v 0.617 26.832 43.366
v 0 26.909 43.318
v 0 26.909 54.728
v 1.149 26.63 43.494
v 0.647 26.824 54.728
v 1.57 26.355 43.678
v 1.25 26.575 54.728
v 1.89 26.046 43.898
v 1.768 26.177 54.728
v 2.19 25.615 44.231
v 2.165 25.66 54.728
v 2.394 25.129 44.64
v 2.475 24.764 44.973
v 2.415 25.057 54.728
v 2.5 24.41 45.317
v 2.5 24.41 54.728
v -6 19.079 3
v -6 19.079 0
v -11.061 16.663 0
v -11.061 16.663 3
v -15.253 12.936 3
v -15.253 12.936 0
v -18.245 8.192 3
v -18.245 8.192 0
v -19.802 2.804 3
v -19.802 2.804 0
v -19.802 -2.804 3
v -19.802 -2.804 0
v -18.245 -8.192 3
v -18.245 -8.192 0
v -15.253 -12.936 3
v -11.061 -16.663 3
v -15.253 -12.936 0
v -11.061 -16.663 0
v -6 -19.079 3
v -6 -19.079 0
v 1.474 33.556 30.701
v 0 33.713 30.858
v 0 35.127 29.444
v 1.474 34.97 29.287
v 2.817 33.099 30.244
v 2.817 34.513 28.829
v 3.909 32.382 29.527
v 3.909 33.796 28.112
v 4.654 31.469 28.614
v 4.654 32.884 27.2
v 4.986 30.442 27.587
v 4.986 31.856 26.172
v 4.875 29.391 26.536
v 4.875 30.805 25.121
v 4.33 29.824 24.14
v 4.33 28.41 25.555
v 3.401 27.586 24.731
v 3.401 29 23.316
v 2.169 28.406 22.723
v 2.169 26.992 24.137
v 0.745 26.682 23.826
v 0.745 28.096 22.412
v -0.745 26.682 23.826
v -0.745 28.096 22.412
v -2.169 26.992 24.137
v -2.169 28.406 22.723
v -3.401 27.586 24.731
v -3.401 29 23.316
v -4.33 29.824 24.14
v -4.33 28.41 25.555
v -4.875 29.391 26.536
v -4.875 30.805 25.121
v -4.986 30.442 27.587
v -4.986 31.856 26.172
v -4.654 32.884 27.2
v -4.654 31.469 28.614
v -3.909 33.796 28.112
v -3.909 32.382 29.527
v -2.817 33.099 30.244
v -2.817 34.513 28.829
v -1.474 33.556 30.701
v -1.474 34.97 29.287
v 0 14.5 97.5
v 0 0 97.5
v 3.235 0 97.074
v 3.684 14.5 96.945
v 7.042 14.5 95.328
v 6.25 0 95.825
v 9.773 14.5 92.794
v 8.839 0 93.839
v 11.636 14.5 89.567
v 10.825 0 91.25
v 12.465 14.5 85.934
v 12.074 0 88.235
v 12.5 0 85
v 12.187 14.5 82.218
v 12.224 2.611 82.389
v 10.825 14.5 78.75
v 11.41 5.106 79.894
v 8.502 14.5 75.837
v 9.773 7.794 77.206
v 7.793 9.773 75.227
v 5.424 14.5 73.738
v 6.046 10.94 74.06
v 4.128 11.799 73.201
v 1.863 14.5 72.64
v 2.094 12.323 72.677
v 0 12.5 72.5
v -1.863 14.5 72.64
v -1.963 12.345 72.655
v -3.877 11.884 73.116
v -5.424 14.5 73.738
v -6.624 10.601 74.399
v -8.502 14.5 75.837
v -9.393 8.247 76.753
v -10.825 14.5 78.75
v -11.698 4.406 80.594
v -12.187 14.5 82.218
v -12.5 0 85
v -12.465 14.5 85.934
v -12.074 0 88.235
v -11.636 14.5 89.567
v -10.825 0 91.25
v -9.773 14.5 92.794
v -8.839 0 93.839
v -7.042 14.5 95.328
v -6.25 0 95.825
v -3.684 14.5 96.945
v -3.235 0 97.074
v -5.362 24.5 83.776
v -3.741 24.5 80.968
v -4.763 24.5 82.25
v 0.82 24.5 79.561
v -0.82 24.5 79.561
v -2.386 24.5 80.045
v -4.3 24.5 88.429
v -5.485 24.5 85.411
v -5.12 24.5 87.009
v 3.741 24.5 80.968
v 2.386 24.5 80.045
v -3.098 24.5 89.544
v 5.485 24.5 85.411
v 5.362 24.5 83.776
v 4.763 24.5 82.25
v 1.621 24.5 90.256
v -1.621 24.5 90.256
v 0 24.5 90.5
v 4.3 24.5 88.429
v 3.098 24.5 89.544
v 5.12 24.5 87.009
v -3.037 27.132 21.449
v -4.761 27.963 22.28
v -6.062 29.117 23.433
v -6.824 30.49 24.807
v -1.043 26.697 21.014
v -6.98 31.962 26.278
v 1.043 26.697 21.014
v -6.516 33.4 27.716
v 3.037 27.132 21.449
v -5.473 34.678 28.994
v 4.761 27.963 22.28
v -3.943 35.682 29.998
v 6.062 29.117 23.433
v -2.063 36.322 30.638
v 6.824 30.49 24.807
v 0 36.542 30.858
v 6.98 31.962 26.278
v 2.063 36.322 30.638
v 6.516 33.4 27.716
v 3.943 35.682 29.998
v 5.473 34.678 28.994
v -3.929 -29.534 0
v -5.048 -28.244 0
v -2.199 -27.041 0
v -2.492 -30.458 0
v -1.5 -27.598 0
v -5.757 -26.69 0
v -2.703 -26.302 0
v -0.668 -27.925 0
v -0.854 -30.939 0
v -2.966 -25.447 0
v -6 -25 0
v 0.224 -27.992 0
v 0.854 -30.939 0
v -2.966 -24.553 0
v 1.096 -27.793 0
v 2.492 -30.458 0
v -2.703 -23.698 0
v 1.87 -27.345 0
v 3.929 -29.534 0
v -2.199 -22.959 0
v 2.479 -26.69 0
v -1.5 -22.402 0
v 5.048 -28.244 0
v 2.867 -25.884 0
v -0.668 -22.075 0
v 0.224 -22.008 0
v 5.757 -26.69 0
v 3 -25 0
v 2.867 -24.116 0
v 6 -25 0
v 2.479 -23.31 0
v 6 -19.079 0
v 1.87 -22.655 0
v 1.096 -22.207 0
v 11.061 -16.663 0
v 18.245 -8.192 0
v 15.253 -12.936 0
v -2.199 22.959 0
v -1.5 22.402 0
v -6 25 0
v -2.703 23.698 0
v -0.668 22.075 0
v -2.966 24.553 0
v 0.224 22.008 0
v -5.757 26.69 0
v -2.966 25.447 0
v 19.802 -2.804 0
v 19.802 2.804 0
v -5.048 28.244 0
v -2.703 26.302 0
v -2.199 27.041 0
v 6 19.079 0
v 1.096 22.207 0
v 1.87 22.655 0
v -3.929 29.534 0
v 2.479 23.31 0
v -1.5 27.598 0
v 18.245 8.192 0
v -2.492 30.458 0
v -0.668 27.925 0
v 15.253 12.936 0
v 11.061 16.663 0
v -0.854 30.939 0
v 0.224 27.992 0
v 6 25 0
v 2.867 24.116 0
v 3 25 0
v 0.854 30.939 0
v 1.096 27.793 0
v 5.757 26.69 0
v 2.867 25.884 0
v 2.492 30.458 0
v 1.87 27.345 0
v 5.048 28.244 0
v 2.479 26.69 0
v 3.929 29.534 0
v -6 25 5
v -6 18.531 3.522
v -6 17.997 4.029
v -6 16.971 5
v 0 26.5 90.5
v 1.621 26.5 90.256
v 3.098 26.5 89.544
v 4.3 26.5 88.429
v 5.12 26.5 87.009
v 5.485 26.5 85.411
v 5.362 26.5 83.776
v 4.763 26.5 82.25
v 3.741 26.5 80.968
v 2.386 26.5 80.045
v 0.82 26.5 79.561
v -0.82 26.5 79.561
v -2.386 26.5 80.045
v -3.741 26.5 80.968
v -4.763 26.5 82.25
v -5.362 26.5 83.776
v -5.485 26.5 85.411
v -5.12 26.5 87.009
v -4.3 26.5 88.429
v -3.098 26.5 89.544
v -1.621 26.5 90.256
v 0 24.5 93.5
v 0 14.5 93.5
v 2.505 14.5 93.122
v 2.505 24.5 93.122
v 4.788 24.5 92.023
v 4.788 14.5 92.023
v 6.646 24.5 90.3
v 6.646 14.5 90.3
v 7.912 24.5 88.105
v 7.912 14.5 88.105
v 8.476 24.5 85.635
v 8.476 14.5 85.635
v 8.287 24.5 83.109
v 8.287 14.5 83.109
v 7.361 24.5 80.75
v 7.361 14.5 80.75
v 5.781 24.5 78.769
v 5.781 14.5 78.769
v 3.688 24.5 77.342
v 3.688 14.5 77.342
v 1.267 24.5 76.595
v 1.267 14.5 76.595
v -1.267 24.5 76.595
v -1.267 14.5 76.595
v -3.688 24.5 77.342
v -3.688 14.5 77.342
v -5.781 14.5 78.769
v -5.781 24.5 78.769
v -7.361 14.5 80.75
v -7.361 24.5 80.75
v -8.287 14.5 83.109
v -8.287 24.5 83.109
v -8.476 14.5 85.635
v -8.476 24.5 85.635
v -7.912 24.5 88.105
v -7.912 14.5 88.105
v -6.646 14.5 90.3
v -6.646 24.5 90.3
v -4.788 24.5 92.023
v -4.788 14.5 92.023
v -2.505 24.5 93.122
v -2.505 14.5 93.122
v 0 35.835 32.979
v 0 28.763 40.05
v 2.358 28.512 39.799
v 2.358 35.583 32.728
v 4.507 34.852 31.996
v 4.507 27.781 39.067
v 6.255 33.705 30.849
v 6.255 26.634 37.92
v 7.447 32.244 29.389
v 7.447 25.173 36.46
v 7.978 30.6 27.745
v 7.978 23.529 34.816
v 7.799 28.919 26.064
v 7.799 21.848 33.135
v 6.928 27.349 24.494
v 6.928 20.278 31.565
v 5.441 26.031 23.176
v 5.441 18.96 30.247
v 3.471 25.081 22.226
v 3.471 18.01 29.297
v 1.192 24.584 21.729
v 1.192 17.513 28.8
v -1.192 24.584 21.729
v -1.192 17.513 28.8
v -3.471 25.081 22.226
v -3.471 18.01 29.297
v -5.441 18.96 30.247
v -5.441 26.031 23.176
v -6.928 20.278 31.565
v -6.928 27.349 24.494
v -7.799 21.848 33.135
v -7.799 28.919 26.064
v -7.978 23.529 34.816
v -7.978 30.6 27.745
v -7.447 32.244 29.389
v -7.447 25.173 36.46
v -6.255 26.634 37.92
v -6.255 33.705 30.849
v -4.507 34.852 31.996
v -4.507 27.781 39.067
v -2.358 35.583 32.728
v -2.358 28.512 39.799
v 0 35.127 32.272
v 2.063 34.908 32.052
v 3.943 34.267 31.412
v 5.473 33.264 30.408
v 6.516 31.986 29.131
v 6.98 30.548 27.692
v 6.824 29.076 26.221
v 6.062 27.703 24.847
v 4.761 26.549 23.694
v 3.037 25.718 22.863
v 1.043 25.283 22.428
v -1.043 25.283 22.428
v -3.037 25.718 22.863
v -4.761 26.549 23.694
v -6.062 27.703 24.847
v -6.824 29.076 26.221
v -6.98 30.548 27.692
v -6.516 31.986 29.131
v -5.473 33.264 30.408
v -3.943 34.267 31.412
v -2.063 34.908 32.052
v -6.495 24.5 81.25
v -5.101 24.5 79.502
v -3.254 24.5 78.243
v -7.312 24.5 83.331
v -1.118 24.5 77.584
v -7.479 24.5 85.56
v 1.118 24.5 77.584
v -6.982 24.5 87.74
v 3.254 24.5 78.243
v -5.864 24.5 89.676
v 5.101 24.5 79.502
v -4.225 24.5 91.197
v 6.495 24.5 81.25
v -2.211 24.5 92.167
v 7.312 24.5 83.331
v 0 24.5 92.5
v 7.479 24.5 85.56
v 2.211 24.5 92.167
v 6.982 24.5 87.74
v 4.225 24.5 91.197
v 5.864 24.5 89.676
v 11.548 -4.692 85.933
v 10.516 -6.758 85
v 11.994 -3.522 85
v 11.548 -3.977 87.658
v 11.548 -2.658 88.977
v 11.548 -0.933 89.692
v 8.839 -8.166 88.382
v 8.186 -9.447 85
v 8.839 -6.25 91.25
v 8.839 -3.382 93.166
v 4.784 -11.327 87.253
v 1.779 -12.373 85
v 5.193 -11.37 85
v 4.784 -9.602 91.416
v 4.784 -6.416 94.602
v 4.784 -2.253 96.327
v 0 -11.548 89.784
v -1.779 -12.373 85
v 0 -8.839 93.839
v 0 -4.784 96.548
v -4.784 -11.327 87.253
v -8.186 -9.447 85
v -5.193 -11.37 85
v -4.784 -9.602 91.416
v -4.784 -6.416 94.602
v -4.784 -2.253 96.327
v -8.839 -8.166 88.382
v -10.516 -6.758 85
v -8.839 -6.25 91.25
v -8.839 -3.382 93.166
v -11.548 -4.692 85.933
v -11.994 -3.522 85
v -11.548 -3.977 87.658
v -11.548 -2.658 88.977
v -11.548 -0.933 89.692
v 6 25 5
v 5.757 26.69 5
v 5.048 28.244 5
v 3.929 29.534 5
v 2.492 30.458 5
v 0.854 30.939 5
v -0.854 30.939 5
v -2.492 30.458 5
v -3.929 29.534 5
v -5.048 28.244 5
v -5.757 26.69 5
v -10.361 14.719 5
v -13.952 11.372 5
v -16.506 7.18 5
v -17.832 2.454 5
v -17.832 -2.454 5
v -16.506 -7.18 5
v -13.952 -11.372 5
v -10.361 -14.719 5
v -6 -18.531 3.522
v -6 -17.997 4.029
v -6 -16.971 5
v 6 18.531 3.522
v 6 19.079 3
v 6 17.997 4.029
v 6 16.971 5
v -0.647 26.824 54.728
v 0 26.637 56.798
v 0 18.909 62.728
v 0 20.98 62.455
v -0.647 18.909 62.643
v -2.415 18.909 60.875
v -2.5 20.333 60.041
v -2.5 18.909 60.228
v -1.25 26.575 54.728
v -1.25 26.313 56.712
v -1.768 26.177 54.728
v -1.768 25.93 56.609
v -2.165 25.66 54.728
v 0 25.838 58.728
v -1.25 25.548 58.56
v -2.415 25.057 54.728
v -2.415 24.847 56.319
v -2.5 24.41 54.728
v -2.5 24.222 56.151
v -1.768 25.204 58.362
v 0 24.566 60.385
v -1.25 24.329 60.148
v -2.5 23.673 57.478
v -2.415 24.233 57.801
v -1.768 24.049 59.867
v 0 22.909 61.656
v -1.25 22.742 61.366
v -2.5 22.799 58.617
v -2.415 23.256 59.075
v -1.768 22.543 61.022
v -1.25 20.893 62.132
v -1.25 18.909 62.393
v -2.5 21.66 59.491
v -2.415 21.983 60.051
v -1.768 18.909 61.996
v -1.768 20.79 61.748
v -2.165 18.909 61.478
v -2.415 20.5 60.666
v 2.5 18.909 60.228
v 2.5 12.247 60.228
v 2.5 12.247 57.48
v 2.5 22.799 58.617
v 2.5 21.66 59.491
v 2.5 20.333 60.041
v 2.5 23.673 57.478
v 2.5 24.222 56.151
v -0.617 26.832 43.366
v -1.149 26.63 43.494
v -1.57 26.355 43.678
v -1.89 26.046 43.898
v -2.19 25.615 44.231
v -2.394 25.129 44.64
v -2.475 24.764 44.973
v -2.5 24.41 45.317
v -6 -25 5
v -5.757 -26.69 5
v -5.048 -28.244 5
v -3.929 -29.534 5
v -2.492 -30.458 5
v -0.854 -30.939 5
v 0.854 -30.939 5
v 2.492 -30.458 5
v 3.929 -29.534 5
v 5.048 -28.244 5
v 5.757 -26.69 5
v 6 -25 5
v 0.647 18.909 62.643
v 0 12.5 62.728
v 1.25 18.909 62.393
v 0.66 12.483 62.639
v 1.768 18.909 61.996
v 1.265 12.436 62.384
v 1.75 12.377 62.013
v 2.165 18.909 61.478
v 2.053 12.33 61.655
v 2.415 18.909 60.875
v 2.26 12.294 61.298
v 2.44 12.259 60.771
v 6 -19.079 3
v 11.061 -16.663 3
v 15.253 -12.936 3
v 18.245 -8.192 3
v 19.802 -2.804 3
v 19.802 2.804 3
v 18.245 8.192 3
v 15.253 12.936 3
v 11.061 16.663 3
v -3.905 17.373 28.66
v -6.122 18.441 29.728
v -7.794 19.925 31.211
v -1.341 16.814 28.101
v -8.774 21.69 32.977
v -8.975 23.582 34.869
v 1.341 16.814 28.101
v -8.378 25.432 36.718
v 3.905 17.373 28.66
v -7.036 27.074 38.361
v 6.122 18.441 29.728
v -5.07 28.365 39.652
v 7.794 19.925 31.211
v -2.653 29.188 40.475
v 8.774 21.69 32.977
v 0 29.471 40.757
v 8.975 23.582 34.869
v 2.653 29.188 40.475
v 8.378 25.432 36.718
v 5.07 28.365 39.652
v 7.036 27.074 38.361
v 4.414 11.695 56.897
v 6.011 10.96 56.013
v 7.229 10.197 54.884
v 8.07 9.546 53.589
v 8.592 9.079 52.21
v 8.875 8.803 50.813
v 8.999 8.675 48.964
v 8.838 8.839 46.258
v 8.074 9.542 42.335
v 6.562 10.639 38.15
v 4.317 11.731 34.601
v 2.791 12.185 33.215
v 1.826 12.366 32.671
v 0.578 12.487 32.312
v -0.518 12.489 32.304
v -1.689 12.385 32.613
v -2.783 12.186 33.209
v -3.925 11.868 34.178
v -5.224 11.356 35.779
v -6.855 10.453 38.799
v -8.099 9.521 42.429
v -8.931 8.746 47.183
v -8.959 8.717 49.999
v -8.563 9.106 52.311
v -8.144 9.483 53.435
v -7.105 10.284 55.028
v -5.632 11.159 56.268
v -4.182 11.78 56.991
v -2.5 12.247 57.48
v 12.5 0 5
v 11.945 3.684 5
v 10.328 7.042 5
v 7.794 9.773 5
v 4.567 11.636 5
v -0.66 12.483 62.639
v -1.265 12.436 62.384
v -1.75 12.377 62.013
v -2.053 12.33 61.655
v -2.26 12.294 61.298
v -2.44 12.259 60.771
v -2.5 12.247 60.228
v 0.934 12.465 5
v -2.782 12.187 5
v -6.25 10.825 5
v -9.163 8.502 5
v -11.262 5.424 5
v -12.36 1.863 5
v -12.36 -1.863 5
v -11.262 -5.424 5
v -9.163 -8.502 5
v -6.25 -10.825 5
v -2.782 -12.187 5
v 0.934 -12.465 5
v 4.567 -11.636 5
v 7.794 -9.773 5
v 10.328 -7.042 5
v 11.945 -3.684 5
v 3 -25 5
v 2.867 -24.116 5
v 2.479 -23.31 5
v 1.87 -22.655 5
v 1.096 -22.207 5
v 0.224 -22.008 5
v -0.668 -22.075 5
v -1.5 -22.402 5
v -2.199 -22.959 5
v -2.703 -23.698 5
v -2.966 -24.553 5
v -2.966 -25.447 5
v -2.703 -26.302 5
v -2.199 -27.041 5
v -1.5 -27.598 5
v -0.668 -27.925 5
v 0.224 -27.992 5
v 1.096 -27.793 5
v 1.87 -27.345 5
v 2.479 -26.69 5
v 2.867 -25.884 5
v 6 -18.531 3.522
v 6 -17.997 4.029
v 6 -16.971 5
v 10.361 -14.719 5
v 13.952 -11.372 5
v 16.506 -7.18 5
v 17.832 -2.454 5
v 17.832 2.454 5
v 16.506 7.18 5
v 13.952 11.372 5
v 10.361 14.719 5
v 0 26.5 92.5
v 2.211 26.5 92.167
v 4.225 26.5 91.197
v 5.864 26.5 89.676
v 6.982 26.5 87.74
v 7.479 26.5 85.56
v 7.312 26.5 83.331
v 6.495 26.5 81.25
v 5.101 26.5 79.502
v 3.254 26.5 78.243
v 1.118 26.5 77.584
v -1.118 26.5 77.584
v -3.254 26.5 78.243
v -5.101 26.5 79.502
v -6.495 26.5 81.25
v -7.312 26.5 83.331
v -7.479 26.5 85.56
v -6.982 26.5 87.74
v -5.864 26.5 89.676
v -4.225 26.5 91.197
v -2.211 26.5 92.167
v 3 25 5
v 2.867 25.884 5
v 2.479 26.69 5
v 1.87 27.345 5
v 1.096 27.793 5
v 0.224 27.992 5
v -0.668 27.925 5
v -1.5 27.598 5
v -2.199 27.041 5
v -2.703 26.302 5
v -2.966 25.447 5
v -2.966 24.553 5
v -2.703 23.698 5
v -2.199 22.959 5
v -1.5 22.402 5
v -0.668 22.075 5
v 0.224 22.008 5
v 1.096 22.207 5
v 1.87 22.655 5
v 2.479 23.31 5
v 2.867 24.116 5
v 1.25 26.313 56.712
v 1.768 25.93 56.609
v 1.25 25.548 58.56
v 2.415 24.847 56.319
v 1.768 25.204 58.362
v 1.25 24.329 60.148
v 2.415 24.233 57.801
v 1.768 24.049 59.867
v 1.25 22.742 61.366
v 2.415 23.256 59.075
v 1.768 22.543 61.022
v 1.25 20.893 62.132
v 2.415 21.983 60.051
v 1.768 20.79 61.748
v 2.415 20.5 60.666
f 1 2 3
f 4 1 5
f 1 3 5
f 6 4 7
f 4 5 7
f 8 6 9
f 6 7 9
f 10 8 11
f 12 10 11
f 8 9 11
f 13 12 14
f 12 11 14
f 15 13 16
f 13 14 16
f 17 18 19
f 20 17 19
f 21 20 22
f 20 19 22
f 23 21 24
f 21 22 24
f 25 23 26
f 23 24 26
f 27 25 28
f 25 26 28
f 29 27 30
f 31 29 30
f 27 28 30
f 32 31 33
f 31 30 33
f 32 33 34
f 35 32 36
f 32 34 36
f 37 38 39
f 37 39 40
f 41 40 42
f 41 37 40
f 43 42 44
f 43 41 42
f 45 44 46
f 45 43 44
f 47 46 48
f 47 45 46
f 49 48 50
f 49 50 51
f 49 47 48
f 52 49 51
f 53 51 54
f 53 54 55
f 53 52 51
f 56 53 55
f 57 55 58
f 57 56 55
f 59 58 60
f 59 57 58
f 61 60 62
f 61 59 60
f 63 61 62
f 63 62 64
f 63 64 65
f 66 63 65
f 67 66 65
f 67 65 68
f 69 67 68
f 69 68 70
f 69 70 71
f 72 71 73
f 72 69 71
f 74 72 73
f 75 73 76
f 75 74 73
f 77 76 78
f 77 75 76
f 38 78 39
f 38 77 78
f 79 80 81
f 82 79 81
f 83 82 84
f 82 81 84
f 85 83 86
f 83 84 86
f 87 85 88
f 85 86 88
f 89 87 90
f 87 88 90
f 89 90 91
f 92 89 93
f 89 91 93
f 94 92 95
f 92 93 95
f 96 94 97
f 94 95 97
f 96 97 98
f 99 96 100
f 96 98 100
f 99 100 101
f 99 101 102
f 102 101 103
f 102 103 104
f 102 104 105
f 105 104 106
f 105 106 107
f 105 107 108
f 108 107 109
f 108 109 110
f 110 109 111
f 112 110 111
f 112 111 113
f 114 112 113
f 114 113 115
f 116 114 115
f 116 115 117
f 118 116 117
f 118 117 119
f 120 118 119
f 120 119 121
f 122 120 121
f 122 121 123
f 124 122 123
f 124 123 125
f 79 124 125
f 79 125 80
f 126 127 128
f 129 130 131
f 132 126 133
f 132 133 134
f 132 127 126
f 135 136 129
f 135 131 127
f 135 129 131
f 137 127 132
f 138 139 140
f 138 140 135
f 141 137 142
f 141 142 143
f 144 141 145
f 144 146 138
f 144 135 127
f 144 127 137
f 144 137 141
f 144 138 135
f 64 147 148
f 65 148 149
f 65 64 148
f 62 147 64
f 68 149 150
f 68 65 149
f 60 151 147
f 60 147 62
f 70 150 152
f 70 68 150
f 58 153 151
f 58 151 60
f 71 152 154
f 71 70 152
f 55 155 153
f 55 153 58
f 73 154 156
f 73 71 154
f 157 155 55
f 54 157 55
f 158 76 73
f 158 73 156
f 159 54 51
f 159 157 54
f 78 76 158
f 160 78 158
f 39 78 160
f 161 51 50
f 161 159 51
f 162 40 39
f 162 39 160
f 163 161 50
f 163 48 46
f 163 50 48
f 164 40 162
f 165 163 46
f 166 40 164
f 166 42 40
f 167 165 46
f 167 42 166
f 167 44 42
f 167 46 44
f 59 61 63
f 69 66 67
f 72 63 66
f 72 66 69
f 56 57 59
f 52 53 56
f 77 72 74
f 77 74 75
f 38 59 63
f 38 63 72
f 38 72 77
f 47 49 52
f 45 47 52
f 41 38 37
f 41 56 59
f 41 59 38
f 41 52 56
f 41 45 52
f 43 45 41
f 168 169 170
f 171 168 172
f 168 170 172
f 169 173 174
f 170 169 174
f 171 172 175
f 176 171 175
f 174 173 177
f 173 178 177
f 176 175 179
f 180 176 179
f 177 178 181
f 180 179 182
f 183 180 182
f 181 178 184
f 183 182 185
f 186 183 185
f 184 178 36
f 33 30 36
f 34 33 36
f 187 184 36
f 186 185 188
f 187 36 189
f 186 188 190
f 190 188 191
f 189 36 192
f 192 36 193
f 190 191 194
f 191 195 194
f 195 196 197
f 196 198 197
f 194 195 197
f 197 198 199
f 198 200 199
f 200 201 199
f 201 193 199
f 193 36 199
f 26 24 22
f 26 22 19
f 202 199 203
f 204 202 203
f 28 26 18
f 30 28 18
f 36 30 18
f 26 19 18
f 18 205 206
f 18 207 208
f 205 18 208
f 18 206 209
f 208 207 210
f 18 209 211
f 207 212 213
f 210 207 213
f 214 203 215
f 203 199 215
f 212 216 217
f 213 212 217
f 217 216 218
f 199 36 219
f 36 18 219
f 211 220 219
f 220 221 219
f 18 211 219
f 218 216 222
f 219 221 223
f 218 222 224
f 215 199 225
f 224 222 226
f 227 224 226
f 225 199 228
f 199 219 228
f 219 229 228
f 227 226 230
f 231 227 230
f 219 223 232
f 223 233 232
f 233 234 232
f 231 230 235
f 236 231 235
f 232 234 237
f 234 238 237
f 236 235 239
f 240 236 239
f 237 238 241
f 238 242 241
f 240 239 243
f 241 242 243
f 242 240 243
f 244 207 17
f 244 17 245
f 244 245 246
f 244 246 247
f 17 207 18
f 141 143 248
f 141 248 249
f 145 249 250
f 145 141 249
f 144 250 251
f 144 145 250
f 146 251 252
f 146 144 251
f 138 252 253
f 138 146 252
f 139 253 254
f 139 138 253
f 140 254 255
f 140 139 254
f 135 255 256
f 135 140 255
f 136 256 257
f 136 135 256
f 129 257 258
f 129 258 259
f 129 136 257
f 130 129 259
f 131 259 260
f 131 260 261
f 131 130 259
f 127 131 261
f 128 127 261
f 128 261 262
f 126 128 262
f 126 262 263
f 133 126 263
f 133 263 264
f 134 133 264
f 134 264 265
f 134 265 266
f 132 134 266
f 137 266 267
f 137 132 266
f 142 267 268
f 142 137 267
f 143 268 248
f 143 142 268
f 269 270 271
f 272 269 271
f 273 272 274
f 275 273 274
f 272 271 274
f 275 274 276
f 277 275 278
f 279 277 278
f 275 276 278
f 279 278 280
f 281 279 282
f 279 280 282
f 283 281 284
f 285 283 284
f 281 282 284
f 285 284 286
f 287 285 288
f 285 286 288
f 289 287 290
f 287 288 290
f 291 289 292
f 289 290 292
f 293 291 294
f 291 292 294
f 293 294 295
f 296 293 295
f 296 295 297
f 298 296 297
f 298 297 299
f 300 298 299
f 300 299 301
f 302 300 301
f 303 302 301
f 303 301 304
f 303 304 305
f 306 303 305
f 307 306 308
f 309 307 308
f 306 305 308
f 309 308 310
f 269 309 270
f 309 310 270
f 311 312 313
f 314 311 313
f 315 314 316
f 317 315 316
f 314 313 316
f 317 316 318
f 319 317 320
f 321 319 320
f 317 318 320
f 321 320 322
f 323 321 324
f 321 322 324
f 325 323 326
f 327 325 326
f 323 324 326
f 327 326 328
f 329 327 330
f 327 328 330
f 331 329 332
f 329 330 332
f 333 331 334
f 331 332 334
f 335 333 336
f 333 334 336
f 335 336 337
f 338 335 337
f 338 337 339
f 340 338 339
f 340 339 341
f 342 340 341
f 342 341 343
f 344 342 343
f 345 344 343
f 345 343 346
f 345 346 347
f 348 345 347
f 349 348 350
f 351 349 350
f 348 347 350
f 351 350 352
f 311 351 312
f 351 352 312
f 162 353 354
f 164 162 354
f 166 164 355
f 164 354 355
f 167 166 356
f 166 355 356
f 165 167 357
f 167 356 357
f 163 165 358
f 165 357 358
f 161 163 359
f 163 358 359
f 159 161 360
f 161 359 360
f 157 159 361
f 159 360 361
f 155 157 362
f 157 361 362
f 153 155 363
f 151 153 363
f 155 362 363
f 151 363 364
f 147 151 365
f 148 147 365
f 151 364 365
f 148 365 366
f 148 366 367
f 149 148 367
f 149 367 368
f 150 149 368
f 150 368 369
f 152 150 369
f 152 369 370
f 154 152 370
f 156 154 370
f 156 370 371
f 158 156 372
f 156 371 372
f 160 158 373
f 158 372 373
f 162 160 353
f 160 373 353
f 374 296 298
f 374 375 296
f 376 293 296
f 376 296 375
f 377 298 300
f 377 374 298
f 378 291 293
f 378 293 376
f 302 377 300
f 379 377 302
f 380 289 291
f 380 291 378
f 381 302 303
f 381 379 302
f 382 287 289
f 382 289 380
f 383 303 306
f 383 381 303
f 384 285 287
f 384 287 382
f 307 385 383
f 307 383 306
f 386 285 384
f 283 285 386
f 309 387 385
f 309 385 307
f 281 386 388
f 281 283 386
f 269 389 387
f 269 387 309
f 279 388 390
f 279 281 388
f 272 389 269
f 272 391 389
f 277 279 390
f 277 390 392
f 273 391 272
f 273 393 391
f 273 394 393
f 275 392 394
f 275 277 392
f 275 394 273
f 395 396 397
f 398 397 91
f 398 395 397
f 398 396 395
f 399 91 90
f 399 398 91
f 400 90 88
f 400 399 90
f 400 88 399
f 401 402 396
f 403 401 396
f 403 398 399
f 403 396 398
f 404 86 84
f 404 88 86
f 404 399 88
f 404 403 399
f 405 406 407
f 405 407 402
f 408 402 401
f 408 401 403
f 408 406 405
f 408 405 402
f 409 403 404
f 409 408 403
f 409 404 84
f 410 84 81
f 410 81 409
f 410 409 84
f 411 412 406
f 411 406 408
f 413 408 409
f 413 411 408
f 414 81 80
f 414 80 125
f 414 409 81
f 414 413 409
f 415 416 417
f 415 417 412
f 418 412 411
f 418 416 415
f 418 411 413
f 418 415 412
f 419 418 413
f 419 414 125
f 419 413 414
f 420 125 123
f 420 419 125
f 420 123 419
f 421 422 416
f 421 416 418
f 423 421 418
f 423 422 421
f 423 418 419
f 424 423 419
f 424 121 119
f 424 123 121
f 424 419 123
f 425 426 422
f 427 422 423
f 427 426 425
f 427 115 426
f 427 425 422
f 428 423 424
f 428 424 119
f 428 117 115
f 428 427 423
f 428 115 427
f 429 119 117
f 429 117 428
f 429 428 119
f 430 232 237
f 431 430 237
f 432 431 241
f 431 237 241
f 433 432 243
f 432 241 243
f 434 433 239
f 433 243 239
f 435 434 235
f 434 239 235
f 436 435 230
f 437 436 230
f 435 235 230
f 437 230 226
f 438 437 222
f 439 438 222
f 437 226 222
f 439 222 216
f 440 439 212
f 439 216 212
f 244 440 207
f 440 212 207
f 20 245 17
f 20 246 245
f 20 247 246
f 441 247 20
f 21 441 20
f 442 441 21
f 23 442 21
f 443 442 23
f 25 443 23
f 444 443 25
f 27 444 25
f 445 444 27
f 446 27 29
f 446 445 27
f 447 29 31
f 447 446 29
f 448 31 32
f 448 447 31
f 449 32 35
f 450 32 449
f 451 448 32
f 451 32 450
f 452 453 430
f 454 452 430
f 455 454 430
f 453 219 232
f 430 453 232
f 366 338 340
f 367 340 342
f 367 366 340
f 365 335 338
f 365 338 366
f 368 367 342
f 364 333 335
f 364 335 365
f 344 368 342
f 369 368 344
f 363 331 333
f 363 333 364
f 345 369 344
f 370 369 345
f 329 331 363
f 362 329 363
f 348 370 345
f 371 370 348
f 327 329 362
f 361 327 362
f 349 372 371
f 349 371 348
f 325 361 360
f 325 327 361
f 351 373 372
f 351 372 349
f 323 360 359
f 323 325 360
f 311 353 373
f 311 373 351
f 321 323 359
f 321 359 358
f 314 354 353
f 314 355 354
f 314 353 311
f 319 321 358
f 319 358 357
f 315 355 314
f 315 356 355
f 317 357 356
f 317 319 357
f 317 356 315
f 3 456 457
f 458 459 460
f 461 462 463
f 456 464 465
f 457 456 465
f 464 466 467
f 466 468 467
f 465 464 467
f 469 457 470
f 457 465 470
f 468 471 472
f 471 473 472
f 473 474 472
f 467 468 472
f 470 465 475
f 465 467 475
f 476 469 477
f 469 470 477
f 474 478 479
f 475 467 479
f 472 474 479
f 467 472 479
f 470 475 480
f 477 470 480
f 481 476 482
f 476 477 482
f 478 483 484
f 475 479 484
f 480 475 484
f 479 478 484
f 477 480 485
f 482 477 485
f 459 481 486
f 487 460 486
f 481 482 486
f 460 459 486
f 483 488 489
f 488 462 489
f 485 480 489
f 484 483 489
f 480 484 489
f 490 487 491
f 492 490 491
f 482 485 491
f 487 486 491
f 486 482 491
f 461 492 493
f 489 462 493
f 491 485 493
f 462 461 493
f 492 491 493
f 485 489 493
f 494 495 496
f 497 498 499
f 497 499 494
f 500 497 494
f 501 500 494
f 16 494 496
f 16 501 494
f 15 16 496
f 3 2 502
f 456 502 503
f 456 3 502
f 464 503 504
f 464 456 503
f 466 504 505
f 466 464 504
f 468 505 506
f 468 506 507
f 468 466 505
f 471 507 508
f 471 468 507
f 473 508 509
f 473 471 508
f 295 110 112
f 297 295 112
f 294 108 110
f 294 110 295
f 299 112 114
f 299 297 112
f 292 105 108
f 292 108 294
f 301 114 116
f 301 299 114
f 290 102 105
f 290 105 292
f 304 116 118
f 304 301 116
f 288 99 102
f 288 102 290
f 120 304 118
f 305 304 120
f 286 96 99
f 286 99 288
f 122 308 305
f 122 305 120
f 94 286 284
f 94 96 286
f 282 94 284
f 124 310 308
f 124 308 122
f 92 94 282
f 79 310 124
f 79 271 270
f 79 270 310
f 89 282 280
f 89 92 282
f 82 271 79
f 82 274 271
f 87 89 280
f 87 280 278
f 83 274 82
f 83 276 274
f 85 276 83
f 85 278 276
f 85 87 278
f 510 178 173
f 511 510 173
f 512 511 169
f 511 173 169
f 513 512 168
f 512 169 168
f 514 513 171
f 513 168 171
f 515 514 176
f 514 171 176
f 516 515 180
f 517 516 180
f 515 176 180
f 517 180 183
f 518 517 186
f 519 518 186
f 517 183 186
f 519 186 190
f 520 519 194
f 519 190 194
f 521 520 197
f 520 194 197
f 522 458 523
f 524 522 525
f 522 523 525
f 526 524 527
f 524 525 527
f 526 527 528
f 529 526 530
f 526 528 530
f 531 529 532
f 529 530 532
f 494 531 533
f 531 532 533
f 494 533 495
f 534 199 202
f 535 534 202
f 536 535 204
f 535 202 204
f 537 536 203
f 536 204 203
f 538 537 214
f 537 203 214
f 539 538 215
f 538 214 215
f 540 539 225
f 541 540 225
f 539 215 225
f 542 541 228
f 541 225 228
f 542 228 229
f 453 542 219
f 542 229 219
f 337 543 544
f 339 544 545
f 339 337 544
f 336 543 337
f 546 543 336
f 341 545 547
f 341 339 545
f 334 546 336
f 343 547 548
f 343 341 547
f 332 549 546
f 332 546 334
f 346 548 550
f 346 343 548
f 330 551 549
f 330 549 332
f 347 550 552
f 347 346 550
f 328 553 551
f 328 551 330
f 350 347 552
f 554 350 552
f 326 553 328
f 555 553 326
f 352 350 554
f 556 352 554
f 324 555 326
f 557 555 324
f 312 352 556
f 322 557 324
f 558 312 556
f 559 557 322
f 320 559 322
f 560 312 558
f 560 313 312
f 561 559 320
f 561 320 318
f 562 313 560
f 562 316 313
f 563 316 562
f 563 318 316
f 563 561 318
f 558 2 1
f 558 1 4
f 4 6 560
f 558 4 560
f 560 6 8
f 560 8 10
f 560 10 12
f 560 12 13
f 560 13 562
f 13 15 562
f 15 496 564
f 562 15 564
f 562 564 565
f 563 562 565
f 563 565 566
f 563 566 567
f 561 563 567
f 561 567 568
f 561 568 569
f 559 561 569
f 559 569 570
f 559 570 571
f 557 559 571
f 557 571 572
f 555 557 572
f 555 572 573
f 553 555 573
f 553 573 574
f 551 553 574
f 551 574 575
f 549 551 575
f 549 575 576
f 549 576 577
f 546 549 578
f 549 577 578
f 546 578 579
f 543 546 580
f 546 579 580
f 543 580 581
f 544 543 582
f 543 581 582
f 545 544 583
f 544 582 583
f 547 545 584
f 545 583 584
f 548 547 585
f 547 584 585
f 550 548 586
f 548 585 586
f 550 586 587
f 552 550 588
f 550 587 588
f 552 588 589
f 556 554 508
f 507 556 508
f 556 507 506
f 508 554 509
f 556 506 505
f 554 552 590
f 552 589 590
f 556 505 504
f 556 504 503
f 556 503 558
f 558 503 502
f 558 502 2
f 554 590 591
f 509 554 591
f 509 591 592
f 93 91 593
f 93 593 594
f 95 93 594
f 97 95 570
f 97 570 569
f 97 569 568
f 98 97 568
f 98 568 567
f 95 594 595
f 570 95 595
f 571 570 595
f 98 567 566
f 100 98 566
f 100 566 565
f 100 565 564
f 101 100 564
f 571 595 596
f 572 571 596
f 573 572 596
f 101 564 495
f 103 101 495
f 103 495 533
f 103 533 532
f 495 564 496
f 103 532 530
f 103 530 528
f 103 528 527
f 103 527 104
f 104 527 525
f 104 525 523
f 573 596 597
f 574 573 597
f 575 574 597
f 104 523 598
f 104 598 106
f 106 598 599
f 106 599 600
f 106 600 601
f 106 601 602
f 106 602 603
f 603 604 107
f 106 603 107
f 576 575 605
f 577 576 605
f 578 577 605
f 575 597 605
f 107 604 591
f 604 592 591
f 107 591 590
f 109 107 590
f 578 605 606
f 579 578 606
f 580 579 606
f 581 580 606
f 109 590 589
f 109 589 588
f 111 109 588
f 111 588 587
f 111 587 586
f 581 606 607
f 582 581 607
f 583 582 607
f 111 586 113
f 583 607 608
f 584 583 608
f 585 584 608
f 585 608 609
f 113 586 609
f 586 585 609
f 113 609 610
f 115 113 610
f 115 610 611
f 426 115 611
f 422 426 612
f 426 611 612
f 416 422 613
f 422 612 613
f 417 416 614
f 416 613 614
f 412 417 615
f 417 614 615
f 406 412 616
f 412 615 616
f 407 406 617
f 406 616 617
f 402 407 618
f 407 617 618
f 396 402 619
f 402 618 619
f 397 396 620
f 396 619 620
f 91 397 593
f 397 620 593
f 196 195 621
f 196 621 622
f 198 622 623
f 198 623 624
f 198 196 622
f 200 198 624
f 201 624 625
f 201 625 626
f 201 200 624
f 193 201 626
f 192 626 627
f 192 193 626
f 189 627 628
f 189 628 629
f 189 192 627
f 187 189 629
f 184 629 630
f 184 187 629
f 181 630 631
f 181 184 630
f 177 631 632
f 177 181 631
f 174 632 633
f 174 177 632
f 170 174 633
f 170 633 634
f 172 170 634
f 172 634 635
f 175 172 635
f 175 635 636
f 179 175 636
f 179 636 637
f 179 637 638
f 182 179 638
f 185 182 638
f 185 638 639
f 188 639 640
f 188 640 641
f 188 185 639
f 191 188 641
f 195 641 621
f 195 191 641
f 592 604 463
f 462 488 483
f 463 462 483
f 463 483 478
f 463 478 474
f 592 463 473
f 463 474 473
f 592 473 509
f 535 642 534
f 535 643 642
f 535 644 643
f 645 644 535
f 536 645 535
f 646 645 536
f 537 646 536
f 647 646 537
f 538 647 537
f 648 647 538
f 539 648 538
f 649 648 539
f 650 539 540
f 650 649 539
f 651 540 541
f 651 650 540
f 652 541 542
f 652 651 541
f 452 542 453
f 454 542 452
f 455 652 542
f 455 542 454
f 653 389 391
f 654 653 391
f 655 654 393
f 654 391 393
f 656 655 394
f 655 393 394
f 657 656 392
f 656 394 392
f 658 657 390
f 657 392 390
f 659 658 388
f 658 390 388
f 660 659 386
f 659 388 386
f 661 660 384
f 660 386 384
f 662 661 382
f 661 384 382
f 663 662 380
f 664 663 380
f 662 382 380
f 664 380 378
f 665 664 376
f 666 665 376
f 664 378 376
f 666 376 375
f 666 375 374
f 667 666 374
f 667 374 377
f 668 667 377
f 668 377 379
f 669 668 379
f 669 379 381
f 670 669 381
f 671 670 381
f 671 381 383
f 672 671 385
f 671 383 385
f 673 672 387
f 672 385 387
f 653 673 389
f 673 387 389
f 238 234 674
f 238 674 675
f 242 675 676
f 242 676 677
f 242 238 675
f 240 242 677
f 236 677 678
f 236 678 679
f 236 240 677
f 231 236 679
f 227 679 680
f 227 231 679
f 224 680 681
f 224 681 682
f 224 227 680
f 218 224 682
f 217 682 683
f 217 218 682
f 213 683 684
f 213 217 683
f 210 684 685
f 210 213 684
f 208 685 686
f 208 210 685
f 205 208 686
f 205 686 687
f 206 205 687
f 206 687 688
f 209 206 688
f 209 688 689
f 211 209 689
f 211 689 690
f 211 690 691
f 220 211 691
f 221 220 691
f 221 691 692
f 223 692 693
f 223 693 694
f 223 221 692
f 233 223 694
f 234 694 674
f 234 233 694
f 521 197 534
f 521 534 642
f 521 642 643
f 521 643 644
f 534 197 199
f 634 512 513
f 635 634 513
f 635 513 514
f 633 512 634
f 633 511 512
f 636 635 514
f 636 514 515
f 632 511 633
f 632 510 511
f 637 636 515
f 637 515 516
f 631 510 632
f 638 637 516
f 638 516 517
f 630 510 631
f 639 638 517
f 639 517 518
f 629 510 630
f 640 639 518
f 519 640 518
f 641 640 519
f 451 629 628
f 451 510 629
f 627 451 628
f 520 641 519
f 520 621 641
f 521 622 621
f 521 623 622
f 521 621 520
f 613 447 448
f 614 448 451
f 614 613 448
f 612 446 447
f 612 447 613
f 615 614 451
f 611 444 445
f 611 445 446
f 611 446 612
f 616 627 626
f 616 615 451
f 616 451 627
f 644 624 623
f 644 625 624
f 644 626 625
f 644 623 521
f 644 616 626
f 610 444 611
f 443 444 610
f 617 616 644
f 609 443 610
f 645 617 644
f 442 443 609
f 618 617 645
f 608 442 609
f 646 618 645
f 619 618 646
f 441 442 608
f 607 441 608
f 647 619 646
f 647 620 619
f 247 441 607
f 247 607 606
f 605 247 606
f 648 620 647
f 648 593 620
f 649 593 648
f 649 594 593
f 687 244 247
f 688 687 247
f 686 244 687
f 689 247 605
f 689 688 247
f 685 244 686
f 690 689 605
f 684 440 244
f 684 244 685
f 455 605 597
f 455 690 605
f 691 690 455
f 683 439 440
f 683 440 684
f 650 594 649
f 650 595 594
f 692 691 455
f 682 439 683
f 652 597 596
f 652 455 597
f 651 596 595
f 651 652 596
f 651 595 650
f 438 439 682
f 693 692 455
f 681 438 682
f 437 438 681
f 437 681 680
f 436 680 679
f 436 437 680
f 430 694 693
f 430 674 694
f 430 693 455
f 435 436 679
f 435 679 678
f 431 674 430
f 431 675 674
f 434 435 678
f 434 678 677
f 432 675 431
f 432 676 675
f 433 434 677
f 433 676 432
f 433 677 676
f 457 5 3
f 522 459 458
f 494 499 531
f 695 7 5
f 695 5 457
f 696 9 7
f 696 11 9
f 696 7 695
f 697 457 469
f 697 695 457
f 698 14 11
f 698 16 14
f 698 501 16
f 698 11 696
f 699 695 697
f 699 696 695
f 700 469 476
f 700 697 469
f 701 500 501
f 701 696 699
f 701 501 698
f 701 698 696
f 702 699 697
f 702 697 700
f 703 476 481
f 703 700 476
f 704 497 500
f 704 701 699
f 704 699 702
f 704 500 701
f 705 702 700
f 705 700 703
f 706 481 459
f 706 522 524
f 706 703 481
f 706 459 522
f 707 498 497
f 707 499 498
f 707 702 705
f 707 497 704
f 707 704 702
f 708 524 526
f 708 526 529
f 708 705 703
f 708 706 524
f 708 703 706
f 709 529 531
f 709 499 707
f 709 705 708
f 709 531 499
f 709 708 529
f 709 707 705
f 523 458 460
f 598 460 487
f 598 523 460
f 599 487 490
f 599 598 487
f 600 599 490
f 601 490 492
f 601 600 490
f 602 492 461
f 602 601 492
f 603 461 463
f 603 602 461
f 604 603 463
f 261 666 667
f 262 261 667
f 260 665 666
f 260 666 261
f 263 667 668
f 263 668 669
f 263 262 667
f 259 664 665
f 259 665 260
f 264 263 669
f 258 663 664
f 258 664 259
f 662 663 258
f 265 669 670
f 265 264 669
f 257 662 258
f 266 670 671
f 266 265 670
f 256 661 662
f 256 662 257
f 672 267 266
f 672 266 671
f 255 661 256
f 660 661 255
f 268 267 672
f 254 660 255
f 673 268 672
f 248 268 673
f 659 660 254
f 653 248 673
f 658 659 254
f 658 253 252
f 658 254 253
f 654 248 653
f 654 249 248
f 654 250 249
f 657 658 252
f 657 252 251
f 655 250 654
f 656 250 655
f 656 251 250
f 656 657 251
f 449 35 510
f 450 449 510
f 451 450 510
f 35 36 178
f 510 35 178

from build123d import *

# Parameters (mm, degrees)
SZKIC1_R                         = 3
DODANIE_WYCI_GNI_CIE1_DEPTH      = 5
SFAZOWANIE1_SIZE                 = 2
SZKIC2_R                         = 12.5
DODANIE_WYCI_GNI_CIE2_DEPTH      = 80
DODANIE_WYCI_GNI_CIE3_DEPTH      = 15
DODANIE_WYCI_GNI_CIE3_DEPTH_BACK = 10
SZKIC5_R                         = 9
SZKIC6_R                         = 8
DODANIE_WYCI_GNI_CIE4_DEPTH      = 10
SZKIC7_R                         = 7
SZKIC7_R_2                       = 5
DODANIE_WYCI_GNI_CIE5_DEPTH      = 2
EBRO1_START                      = -2.5
EBRO1_DEPTH                      = 5
ZAOKR_GLENIE1_R                  = 2.5
DODANIE_WYCI_GNI_CIE6_DEPTH      = 2
DODANIE_WYCI_GNI_CIE6_DEPTH_BACK = 12.5
SZKIC9_R                         = 12.5
OBR_T1_ANGLE                     = 90
SZKIC11_R                        = 8.5
DODANIE_WYCI_GNI_CIE7_DEPTH      = 10
SZKIC12_R                        = 7.5
SZKIC12_R_2                      = 5.5
DODANIE_WYCI_GNI_CIE8_DEPTH      = 2


# Read off the part's stored shape, not the designer's step: Żebro1
with BuildPart() as part:
    # Szkic1 → Dodanie-wyciągnięcie1 (new body)
    with BuildSketch(Plane.XY):
        with BuildLine():
            Line((6, 19.078784028), (6, 25))
            ThreePointArc((6, 25), (0, 31), (-6, 25))
            Line((-6, 25), (-6, 19.078784028))
            ThreePointArc((-6, 19.078784028), (-20, 0), (-6, -19.078784028))
            Line((-6, -19.078784028), (-6, -25))
            ThreePointArc((-6, -25), (0, -31), (6, -25))
            Line((6, -25), (6, -19.078784028))
            ThreePointArc((6, -19.078784028), (20, 0), (6, 19.078784028))
        make_face()
        with Locations((0, 25)):
            Circle(SZKIC1_R, mode=Mode.SUBTRACT)
        with Locations((0, -25)):
            Circle(SZKIC1_R, mode=Mode.SUBTRACT)
    extrude(amount=DODANIE_WYCI_GNI_CIE1_DEPTH)

    # Sfazowanie1
    sfazowanie1_edges = [part.edges().sort_by_distance(p)[0] for p in [
        (20, 0, 5),
        (-20, 0, 5),
    ]]
    chamfer(sfazowanie1_edges, length=SFAZOWANIE1_SIZE)

    # Szkic2 → Dodanie-wyciągnięcie2 (add)
    with BuildSketch(Plane.XY.offset(5)):
        Circle(SZKIC2_R)
    extrude(amount=DODANIE_WYCI_GNI_CIE2_DEPTH)

    # Szkic5 → Dodanie-wyciągnięcie3 (add, two sides: drawn at the far end of the back side and taken through both)
    with BuildSketch(Plane(origin=(0, 12.5, 45), x_dir=(1, 0, 0), z_dir=(0, 0.7071067811865437, -0.7071067811865515)).offset(-DODANIE_WYCI_GNI_CIE3_DEPTH_BACK)):
        with Locations(Location((0, 0, 0), (0, 0, 270))):
            Circle(SZKIC5_R)
    extrude(amount=DODANIE_WYCI_GNI_CIE3_DEPTH + DODANIE_WYCI_GNI_CIE3_DEPTH_BACK)

    # Szkic6 → Dodanie-wyciągnięcie4 (add)
    with BuildSketch(Plane(origin=(0, -5.643398282, 5.643398282), x_dir=(1, 0, 0), z_dir=(0, 0.7071067811865437, -0.7071067811865513))):
        with Locations(Location((0, -40.658639918, 0), (0, 0, 270))):
            Circle(SZKIC6_R)
    extrude(amount=DODANIE_WYCI_GNI_CIE4_DEPTH)

    # Szkic7 → Dodanie-wyciągnięcie5 (add)
    with BuildSketch(Plane(origin=(0, 1.42766953, -1.42766953), x_dir=(1, 0, 0), z_dir=(0, 0.7071067811865437, -0.7071067811865515))):
        with Locations(Location((0, -40.658639918, 0), (0, 0, 270))):
            Circle(SZKIC7_R)
        with Locations(Location((0, -40.658639918, 0), (0, 0, 270))):
            Circle(SZKIC7_R_2, mode=Mode.SUBTRACT)
    extrude(amount=DODANIE_WYCI_GNI_CIE5_DEPTH)

    # Żebro1 outline → Żebro1 (add)
    with BuildSketch(Plane(origin=(0, 0, 0), x_dir=(0, 0, -1), z_dir=(1, 0, 0)).offset(EBRO1_START)):
        with BuildLine():
            Line((-62.727922061, 18.909453225), (-62.727922061, 12))
            Line((-62.727922061, 12), (-42, 12))
            Line((-42, 12), (-42, 26.909453225))
            Line((-42, 26.909453225), (-54.727922061, 26.909453225))
            ThreePointArc((-54.727922061, 26.909453225), (-60.384776311, 24.566307475), (-62.727922061, 18.909453225))
        make_face()
    extrude(amount=EBRO1_DEPTH)

    # Zaokrąglenie1
    zaokr_glenie1_edges = [part.edges().sort_by_distance(p)[0] for p in [
        (-2.5, 15.578450969, 62.727922061),
        (-2.5, 26.909453225, 48.772744048),
        (2.5, 15.578450969, 62.727922061),
        (2.5, 24.566307475, 60.384776311),
        (-2.5, 24.566307475, 60.384776311),
        (2.5, 26.909453225, 48.772744048),
    ]]
    fillet(zaokr_glenie1_edges, radius=ZAOKR_GLENIE1_R - 0.0001)  # a hair under: the kernel refuses the full size

    # Szkic9 → Dodanie-wyciągnięcie6 (add, two sides: drawn at the far end of the back side and taken through both)
    with BuildSketch(Plane(origin=(0, 12.5, 0), x_dir=(1, 0, 0), z_dir=(0, 1, 0)).offset(-DODANIE_WYCI_GNI_CIE6_DEPTH_BACK)):
        with Locations(Location((0, -85, 0), (0, 0, 270))):
            Circle(SZKIC9_R)
    extrude(amount=DODANIE_WYCI_GNI_CIE6_DEPTH + DODANIE_WYCI_GNI_CIE6_DEPTH_BACK)

    # Szkic10 → Obrót1 (revolve)
    with BuildSketch(Plane.XY.offset(85)):
        with BuildLine():
            Line((-12.5, 0), (12.5, 0))
            ThreePointArc((12.5, 0), (0, -12.5), (-12.5, 0))
        make_face()
    revolve(axis=Axis((-12.5, 0, 85), (-1, 0, 0)), revolution_arc=OBR_T1_ANGLE)

    # Szkic11 → Dodanie-wyciągnięcie7 (add)
    with BuildSketch(Plane(origin=(0, 14.5, 0), x_dir=(1, 0, 0), z_dir=(0, 1, 0))):
        with Locations(Location((0, -85, 0), (0, 0, 270))):
            Circle(SZKIC11_R)
    extrude(amount=DODANIE_WYCI_GNI_CIE7_DEPTH)

    # Szkic12 → Dodanie-wyciągnięcie8 (add)
    with BuildSketch(Plane(origin=(0, 24.5, 0), x_dir=(1, 0, 0), z_dir=(0, 1, 0))):
        with Locations(Location((0, -85, 0), (0, 0, 270))):
            Circle(SZKIC12_R)
        with Locations(Location((0, -85, 0), (0, 0, 270))):
            Circle(SZKIC12_R_2, mode=Mode.SUBTRACT)
    extrude(amount=DODANIE_WYCI_GNI_CIE8_DEPTH)


solid = part.part
